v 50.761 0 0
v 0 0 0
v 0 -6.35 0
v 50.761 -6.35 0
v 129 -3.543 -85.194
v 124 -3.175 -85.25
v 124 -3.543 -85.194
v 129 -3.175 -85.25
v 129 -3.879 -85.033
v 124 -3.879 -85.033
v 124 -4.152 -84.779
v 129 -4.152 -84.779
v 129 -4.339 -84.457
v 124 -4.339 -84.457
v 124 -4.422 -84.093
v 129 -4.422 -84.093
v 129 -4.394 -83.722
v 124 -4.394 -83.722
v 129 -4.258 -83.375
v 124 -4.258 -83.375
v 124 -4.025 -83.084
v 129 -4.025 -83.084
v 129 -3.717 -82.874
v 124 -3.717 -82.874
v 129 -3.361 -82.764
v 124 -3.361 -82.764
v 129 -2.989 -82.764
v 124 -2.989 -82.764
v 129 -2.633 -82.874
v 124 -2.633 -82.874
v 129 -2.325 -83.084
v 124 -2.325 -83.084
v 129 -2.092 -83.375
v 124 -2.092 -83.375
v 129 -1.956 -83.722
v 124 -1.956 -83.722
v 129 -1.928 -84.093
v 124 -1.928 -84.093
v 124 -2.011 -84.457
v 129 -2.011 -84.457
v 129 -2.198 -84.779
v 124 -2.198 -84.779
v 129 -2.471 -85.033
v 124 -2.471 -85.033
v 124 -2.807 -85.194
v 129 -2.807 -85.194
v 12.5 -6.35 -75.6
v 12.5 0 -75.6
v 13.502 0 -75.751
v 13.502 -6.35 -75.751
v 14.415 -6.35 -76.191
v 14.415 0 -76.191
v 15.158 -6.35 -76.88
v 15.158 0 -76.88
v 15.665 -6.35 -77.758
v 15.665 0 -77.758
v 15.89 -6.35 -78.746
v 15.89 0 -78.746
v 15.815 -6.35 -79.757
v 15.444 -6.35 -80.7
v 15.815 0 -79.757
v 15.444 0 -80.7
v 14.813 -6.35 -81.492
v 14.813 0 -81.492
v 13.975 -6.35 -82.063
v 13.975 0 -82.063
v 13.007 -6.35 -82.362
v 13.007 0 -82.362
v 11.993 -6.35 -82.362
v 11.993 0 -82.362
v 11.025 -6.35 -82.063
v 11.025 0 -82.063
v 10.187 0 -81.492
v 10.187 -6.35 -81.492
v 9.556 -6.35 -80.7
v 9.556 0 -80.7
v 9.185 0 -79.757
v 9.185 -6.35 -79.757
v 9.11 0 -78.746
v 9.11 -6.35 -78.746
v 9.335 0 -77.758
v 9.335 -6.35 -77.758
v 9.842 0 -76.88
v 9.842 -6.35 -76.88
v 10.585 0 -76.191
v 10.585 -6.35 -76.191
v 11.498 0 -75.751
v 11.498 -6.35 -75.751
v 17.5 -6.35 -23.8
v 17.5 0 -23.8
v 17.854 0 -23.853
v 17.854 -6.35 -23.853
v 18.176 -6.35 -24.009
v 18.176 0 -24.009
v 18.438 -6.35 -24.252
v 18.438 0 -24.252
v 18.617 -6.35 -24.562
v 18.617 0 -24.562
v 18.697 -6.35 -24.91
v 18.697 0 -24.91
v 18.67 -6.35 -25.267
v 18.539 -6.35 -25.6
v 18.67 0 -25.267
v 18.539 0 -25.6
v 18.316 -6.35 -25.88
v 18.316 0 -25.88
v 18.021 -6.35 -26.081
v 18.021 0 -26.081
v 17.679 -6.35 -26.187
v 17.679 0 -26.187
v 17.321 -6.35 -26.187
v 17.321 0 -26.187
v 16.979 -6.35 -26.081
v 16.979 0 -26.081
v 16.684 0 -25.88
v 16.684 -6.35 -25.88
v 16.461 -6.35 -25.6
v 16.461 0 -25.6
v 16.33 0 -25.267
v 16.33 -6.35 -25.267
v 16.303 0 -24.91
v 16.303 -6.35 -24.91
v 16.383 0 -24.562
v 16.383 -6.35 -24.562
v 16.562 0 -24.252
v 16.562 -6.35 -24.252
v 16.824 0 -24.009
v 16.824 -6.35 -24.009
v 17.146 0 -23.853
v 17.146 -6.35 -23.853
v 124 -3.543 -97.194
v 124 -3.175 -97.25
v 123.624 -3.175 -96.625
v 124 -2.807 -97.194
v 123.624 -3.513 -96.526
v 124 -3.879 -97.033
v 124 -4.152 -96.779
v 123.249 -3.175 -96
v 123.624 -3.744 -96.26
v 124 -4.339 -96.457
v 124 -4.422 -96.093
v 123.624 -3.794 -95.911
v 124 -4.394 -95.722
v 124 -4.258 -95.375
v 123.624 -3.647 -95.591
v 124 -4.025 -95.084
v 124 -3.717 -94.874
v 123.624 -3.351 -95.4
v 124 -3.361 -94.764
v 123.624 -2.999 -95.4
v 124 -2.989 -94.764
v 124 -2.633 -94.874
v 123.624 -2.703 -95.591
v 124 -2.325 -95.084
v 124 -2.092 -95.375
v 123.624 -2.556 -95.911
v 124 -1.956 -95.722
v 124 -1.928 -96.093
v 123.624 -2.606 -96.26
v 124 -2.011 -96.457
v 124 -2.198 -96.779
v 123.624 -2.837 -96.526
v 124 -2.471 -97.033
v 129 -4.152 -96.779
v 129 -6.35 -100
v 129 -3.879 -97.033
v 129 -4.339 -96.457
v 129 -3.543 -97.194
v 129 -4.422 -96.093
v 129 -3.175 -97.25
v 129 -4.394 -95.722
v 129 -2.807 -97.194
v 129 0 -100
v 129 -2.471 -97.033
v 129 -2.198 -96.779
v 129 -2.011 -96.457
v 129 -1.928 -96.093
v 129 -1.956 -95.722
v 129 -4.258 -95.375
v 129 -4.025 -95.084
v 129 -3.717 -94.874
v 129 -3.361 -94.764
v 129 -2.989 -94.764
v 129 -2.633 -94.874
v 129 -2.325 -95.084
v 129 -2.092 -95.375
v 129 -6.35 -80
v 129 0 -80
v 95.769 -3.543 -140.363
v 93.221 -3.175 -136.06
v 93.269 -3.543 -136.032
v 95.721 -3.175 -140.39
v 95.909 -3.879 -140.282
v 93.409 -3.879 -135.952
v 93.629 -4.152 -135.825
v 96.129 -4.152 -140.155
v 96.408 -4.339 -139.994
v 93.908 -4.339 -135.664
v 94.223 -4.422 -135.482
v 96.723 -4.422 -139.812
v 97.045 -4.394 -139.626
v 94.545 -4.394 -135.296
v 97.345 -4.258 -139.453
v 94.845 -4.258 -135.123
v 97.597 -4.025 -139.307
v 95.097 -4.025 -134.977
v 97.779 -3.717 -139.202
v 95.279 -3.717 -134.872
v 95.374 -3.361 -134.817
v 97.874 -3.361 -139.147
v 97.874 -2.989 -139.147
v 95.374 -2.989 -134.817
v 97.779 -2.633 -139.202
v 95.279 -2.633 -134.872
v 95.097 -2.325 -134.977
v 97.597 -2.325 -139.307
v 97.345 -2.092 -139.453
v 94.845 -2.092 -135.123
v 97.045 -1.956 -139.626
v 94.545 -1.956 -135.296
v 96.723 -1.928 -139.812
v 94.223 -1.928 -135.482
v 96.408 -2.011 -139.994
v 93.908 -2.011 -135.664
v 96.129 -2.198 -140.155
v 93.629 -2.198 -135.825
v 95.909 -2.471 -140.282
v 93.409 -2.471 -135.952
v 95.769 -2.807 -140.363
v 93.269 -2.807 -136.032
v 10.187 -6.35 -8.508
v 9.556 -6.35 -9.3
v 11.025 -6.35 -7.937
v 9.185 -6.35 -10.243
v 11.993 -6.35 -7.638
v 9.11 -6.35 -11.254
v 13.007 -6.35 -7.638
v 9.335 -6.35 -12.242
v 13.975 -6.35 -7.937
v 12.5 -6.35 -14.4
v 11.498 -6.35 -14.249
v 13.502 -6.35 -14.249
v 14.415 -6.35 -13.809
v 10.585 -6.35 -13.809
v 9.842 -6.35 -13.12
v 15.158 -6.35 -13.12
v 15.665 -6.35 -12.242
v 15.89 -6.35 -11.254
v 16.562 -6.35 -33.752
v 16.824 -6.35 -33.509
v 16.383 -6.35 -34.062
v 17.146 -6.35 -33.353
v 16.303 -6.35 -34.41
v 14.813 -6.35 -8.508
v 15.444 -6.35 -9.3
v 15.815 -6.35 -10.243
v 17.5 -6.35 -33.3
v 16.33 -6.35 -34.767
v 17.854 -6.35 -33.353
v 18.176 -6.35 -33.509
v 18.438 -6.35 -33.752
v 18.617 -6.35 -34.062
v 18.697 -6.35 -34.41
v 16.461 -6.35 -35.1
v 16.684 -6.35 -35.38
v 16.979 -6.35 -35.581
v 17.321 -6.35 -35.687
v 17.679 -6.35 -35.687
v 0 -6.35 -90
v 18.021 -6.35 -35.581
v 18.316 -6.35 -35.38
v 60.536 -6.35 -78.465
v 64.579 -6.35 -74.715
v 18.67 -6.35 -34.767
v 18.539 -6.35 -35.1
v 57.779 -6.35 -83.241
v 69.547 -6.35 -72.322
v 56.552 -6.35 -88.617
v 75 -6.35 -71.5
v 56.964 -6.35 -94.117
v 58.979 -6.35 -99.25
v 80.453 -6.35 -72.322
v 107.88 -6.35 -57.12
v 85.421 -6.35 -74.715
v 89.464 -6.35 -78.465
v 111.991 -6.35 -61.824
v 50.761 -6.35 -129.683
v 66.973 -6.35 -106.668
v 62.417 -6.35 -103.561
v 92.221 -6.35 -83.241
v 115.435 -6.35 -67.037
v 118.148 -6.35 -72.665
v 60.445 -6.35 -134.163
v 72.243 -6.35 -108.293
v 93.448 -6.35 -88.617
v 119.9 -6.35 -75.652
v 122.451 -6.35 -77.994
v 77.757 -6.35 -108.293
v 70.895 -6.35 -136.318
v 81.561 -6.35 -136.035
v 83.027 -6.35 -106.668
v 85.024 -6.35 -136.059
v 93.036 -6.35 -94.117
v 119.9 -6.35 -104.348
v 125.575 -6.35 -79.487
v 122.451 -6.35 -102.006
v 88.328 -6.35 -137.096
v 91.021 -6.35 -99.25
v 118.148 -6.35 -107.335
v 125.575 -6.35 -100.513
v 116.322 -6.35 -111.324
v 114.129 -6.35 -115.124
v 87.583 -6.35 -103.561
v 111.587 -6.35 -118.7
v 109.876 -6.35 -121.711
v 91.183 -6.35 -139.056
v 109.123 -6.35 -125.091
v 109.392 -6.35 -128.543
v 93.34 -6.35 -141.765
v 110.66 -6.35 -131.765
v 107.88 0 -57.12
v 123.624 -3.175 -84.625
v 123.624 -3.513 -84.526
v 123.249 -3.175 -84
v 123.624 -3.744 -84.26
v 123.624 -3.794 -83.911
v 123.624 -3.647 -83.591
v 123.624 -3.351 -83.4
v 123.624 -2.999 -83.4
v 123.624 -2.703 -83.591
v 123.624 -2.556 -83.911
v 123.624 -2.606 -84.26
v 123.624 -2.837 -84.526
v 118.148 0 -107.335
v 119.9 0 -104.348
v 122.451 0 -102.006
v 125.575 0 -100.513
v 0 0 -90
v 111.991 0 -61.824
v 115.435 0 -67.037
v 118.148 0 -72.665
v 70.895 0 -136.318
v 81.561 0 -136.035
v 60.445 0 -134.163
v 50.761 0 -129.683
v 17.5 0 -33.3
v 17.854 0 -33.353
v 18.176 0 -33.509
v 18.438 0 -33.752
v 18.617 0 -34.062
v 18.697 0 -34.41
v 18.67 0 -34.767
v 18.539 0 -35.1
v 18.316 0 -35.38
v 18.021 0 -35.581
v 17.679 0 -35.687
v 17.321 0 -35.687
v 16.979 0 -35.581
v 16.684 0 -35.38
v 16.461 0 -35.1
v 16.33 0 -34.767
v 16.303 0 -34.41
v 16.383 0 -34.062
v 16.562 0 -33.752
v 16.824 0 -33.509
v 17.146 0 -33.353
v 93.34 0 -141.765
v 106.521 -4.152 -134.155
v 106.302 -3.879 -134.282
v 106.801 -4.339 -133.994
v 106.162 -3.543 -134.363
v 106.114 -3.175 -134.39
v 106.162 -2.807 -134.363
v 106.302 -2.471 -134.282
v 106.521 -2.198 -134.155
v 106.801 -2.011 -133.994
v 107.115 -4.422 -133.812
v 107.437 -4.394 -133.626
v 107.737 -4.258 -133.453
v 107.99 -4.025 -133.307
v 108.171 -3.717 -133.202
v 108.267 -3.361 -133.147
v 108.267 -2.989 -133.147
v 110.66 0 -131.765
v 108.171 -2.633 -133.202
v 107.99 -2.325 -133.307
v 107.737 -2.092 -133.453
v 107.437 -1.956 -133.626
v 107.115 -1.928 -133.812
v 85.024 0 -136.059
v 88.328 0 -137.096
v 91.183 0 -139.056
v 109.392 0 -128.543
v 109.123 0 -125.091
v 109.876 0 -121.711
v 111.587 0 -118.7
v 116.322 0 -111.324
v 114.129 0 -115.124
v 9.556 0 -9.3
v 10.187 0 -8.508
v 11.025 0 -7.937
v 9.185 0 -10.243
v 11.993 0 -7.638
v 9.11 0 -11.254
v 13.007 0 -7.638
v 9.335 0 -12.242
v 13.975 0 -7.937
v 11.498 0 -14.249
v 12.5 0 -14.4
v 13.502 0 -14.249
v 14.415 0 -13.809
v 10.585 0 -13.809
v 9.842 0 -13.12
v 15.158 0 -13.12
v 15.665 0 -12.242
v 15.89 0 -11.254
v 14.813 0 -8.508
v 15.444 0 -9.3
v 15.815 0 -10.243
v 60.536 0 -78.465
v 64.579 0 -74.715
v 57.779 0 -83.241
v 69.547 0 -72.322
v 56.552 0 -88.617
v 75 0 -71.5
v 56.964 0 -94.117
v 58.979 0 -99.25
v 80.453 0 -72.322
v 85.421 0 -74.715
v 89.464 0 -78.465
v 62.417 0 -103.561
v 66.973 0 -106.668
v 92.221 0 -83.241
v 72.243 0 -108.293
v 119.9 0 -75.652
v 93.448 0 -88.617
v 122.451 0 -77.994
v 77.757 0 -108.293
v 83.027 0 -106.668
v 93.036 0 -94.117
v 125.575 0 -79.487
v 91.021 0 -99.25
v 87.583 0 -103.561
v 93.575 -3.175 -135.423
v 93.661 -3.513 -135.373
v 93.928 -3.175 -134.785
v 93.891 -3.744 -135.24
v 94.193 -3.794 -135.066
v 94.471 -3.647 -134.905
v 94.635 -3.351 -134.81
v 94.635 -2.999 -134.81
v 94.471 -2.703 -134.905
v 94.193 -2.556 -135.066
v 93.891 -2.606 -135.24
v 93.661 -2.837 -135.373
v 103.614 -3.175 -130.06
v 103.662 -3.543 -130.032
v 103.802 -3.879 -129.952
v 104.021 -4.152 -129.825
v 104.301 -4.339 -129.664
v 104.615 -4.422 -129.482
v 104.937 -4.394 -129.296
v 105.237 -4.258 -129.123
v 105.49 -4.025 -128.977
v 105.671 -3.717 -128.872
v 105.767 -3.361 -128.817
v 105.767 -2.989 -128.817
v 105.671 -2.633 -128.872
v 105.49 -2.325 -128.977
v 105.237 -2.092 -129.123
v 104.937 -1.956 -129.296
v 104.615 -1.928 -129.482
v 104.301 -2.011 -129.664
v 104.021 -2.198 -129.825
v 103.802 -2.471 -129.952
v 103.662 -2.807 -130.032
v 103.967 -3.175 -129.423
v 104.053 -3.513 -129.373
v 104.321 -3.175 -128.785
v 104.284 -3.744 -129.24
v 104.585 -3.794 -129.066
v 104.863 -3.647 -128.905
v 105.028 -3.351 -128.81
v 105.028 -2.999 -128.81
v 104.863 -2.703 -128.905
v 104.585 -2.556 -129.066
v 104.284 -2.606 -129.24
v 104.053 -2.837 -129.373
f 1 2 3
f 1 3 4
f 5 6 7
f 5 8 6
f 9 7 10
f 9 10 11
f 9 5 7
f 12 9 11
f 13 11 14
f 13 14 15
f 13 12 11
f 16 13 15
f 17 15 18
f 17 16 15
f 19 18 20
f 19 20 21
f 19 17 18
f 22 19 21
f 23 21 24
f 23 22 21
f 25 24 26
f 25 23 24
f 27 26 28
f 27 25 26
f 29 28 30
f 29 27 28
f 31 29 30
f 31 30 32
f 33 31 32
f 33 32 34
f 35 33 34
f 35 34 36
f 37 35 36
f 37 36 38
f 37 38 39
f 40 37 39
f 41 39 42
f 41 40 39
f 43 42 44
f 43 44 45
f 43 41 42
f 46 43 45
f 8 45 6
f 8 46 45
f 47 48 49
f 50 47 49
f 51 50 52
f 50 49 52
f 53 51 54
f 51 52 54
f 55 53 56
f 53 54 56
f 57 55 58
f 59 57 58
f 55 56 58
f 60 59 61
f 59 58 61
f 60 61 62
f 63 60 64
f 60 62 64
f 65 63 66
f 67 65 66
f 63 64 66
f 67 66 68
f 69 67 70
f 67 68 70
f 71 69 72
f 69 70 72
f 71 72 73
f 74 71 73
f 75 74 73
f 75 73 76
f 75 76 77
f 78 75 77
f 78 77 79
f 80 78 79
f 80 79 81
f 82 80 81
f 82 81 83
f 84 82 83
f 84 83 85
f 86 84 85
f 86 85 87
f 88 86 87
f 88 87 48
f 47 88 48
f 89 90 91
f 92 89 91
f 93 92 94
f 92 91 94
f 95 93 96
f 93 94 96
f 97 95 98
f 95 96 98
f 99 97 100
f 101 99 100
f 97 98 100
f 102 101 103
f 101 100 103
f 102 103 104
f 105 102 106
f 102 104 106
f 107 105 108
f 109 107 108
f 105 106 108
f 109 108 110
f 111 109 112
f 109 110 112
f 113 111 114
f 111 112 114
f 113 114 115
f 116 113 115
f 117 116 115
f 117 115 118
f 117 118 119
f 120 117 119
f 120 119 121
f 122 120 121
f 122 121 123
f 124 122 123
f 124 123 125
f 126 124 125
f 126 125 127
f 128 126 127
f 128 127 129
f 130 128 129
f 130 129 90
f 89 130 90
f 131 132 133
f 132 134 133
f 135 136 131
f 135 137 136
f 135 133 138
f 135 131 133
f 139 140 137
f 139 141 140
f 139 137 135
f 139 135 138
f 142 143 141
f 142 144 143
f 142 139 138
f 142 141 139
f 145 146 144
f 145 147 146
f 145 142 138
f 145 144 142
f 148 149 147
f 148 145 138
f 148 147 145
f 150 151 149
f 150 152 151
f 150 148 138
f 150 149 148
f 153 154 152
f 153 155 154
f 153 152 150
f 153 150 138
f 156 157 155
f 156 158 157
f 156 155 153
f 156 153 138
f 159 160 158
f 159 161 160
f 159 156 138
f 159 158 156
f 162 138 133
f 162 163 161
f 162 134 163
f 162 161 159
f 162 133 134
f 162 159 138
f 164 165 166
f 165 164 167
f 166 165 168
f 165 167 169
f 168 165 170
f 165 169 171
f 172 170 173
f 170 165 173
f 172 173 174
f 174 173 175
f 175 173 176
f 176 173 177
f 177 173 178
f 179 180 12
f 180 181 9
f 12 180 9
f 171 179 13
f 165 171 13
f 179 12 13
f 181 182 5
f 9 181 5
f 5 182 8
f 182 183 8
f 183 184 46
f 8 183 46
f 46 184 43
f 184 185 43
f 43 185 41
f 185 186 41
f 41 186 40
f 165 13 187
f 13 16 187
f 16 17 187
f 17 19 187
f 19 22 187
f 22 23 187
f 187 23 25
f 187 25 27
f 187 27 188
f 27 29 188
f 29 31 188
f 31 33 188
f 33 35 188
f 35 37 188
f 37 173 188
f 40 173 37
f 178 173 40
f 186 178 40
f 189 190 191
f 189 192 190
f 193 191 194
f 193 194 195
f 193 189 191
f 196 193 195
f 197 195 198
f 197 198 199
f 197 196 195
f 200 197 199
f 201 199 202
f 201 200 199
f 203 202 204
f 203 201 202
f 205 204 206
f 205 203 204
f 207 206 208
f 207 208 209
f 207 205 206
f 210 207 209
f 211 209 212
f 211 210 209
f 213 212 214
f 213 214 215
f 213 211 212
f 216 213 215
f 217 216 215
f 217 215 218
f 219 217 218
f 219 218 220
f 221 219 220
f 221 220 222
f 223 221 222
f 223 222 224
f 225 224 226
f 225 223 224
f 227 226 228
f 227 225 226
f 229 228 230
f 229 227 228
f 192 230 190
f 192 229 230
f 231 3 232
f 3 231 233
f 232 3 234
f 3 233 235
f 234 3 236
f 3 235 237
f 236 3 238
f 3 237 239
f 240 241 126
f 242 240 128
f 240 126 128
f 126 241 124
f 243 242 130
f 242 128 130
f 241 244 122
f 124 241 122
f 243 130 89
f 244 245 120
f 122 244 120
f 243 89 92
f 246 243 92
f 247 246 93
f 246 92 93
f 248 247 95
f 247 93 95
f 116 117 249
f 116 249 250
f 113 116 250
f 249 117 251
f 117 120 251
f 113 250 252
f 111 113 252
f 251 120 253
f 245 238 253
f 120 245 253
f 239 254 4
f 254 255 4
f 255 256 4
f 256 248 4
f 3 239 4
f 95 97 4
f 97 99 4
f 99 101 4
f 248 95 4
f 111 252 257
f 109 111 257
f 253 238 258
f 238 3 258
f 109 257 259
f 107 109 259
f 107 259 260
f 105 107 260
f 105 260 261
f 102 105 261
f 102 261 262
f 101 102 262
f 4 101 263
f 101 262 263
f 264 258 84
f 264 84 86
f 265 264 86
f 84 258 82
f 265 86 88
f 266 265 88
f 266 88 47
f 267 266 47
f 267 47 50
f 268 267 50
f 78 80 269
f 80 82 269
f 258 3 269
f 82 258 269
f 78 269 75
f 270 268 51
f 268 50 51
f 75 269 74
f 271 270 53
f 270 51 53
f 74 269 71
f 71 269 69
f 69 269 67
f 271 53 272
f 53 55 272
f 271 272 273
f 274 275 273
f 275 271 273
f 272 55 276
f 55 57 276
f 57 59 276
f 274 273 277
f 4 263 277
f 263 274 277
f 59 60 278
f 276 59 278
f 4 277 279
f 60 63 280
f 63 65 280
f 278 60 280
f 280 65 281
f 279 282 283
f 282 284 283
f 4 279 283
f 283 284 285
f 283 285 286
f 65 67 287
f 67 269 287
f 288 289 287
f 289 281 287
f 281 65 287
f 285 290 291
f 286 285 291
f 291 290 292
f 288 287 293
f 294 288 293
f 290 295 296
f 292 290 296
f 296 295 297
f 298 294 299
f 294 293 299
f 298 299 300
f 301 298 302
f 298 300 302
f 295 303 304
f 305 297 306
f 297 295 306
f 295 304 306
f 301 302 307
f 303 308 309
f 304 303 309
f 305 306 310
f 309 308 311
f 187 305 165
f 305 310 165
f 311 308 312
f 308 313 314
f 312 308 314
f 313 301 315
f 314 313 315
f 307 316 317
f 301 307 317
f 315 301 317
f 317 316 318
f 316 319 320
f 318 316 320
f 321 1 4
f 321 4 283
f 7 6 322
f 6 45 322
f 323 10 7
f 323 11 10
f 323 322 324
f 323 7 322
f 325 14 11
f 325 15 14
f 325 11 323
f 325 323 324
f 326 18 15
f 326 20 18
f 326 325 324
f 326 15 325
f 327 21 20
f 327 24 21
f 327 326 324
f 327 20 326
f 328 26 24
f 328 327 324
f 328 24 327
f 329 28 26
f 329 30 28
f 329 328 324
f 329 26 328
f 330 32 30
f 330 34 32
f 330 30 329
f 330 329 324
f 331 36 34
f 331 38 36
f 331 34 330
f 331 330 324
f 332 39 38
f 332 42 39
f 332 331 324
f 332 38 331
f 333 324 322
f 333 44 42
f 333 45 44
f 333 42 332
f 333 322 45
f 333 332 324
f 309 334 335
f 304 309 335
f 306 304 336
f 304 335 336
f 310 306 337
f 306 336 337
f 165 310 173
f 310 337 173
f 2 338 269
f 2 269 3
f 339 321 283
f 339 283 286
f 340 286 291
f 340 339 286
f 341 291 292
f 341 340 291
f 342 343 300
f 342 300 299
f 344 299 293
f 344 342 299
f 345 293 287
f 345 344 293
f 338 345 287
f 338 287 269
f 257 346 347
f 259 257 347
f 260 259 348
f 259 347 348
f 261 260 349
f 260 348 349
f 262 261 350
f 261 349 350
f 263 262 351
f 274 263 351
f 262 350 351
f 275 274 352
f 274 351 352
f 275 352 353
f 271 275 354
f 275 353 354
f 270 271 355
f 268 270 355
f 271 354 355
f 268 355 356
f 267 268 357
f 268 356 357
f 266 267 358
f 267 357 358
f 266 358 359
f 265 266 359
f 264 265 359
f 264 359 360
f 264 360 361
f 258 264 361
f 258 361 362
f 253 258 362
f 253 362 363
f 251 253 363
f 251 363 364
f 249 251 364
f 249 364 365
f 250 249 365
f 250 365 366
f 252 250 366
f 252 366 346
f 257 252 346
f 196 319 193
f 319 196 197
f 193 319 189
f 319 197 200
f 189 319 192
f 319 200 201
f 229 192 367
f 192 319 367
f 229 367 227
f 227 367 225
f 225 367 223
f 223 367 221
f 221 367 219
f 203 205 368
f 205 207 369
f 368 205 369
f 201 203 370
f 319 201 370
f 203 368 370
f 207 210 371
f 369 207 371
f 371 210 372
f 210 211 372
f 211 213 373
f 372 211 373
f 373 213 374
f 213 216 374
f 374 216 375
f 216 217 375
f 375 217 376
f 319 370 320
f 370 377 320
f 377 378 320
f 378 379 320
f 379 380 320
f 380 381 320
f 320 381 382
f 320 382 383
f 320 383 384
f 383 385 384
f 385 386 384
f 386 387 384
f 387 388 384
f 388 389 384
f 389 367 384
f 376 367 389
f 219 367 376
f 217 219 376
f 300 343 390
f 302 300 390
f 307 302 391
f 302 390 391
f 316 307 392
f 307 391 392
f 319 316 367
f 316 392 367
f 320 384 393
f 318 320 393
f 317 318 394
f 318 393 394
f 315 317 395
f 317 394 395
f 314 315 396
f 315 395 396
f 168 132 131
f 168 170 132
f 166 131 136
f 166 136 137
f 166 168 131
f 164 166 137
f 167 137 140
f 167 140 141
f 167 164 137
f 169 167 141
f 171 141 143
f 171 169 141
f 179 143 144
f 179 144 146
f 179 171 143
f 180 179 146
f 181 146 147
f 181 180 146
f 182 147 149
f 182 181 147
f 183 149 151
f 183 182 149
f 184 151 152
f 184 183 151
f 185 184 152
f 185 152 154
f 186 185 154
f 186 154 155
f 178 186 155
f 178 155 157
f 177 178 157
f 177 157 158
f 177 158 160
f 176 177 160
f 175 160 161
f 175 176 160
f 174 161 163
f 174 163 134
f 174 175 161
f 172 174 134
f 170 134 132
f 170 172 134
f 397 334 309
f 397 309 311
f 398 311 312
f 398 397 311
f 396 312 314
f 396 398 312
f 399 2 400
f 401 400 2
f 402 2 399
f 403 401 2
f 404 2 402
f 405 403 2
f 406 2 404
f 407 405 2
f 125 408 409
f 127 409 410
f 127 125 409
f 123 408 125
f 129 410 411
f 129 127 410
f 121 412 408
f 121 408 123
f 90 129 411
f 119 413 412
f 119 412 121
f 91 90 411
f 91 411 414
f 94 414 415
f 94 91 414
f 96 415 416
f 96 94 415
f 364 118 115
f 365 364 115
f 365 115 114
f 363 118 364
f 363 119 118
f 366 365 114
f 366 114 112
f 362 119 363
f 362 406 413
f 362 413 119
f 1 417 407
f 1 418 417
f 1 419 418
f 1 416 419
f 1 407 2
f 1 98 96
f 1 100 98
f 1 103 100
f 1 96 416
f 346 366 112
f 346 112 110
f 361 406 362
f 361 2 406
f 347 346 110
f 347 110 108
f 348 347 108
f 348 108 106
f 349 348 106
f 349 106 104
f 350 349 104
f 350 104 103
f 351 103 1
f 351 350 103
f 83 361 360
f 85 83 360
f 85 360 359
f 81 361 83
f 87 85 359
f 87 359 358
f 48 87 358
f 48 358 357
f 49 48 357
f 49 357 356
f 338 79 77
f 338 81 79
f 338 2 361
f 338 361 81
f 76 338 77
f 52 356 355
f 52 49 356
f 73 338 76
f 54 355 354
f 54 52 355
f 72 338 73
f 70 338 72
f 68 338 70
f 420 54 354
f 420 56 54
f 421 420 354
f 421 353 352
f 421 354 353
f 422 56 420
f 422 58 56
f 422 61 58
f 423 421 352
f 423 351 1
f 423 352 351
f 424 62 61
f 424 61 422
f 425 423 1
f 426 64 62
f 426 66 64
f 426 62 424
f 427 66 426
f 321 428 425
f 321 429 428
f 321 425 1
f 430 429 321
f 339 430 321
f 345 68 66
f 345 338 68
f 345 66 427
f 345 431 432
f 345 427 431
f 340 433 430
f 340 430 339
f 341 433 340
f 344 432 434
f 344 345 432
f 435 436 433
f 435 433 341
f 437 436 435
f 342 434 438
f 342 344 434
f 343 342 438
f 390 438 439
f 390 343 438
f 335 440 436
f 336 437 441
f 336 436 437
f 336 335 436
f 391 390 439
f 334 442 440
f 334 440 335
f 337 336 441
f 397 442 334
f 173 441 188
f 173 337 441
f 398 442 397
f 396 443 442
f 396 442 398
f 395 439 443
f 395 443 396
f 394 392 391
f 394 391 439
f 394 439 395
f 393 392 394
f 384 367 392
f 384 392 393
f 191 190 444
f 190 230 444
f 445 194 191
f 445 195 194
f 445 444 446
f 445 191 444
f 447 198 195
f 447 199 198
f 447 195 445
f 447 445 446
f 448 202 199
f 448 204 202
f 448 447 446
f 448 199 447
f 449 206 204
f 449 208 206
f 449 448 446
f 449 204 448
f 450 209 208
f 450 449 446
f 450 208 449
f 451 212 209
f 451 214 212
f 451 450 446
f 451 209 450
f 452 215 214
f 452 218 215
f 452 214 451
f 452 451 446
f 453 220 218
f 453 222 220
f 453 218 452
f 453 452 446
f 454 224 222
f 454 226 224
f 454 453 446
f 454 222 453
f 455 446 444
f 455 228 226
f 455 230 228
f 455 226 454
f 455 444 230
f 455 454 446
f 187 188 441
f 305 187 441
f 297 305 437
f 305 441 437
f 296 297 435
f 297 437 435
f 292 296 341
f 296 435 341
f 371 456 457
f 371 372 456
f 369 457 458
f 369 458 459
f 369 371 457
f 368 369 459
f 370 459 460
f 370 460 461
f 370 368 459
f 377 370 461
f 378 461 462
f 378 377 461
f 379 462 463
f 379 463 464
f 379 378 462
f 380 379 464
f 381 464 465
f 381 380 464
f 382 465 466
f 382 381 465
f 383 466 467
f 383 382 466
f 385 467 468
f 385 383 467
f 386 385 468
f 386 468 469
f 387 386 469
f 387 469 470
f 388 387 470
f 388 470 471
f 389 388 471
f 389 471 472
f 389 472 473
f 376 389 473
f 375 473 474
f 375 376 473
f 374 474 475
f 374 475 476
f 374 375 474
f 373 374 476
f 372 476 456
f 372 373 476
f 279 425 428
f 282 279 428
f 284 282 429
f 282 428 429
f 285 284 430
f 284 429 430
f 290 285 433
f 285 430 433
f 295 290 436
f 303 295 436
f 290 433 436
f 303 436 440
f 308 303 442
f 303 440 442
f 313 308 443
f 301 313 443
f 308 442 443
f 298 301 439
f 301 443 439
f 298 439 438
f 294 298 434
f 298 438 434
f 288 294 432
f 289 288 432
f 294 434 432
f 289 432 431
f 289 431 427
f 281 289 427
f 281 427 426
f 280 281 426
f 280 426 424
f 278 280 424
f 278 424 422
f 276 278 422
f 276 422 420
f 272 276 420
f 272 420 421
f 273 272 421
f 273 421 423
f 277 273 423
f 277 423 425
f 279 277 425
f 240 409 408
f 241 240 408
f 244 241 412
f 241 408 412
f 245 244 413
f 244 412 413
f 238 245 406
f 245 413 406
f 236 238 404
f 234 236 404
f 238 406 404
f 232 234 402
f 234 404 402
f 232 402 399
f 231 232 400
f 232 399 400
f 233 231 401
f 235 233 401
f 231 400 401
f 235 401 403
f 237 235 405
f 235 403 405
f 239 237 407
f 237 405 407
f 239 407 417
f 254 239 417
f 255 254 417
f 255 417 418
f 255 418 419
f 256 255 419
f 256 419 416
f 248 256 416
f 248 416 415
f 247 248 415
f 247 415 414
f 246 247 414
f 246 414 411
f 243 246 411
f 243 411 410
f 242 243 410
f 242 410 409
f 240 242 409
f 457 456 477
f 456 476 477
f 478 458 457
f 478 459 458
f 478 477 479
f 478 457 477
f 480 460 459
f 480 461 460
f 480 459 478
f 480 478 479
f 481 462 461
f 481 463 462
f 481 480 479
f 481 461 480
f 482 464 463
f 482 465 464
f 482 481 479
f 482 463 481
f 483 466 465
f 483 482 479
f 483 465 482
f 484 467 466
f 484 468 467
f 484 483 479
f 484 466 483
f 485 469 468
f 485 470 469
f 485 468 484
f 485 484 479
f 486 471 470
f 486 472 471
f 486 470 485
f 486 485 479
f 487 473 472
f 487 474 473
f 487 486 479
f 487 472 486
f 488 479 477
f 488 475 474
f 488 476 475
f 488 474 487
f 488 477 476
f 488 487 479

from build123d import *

# Parameters (mm, degrees)
BASE_FLANGE1_DEPTH                   = 6.35
SKETCH8_R                            = 3.4
CUT_EXTRUDE1_DEPTH                   = 183.851914127
SKETCH9_R                            = 18.5
CUT_EXTRUDE2_DEPTH                   = 183.851914127
SKETCH11_R                           = 1.2
CUT_EXTRUDE4_DEPTH                   = 183.851914127
BOSS_EXTRUDE2_START                  = -6.35
BOSS_EXTRUDE2_DEPTH                  = 6.35
TAP_DRILL_FOR_M3X0_5_TAP2_AT_2_COUNT = 2
TAP_DRILL_FOR_M3X0_5_TAP2_AT_2_PITCH = 12
CIRPATTERN3_COUNT                    = 2
CIRPATTERN3_ANGLE                    = 60


# Sheet-metal steps are written as plain solids
with BuildPart() as part:
    # Sketch2 → Base-Flange1 (new body)
    with BuildSketch(Plane(origin=(0, 0, 0), x_dir=(1, 0, 0), z_dir=(0, 1, 0))):
        with BuildLine():
            Line((0, 0), (50.76093065, 0))
            Line((50.76093065, 0), (107.880465325, 57.119534675))
            ThreePointArc((107.880465325, 57.119534675), (111.537953618, 118.761570635), (50.76093065, 129.682710556))
            Line((50.76093065, 129.682710556), (0, 90))
            Line((0, 90), (0, 0))
        make_face()
    extrude(amount=-BASE_FLANGE1_DEPTH)

    # Sketch8 → Cut-Extrude1 (cut, through all)
    with BuildSketch(Plane(origin=(0, 0, 0), x_dir=(1, 0, 0), z_dir=(0, 1, 0))):
        with Locations(Location((12.5, 79, 0), (0, 0, 270))):
            Circle(SKETCH8_R)
        with Locations(Location((12.5, 11, 0), (0, 0, 90))):
            Circle(SKETCH8_R)
    extrude(amount=-CUT_EXTRUDE1_DEPTH, mode=Mode.SUBTRACT)

    # Sketch9 → Cut-Extrude2 (cut, through all)
    with BuildSketch(Plane(origin=(0, 0, 0), x_dir=(1, 0, 0), z_dir=(0, 1, 0))):
        with Locations(Location((75, 90, 0), (0, 0, 270))):
            Circle(SKETCH9_R)
    extrude(amount=-CUT_EXTRUDE2_DEPTH, mode=Mode.SUBTRACT)

    # Sketch11 → Cut-Extrude4 (cut, through all)
    with BuildSketch(Plane(origin=(0, 0, 0), x_dir=(1, 0, 0), z_dir=(0, 1, 0))):
        with Locations(Location((17.5, 25, 0), (0, 0, 270))):
            Circle(SKETCH11_R)
        with Locations(Location((17.5, 34.5, 0), (0, 0, 270))):
            Circle(SKETCH11_R)
    extrude(amount=-CUT_EXTRUDE4_DEPTH, mode=Mode.SUBTRACT)

    # Sketch15 → Boss-Extrude2 (add)
    with BuildSketch(Plane.XZ.offset(6.35).offset(BOSS_EXTRUDE2_START)):
        with BuildLine():
            Line((129, -100), (129, -80))
            ThreePointArc((129, -80), (122.450687881, -77.994187792), (118.147884423, -72.66477373))
            ThreePointArc((118.147884423, -72.66477373), (121.5, -90), (118.147884423, -107.33522627))
            ThreePointArc((118.147884423, -107.33522627), (122.450687881, -102.005812208), (129, -100))
        make_face()
    boss_extrude2 = extrude(amount=BOSS_EXTRUDE2_DEPTH)

    # Sketch17 → Tap Drill for M3x0.5 Tap2 (revolve, cut)
    with BuildSketch(Plane(origin=(129, -3.175, -84), x_dir=(0, 0, -1), z_dir=(0, 1, 0))):
        Polygon((0, 0), (0, 5.751075774), (1.25, 5), (1.25, 0), align=None)
    tap_drill_for_m3x0_5_tap2 = revolve(axis=Axis((135.35, -3.175, -84), (-1, 0, 0)), mode=Mode.SUBTRACT)

    # Tap Drill for M3x0.5 Tap2 at 2: Tap Drill for M3x0.5 Tap2 ×2
    with Locations(*[(0, 0, -i * TAP_DRILL_FOR_M3X0_5_TAP2_AT_2_PITCH) for i in range(1, TAP_DRILL_FOR_M3X0_5_TAP2_AT_2_COUNT)]):
        add(tap_drill_for_m3x0_5_tap2, mode=Mode.SUBTRACT)

    # CirPattern3: Boss-Extrude2, Tap Drill for M3x0.5 Tap2 ×2 about axis
    cirpattern3_axis = Axis((75, 0, -90), (0, 1, 0))
    add([boss_extrude2.rotate(cirpattern3_axis, i * CIRPATTERN3_ANGLE / (CIRPATTERN3_COUNT - 1)) for i in range(1, CIRPATTERN3_COUNT)])
    add([tap_drill_for_m3x0_5_tap2.rotate(cirpattern3_axis, i * CIRPATTERN3_ANGLE / (CIRPATTERN3_COUNT - 1)) for i in range(1, CIRPATTERN3_COUNT)], mode=Mode.SUBTRACT)

    # CirPattern3 copy 1 sketch → CirPattern3 copy 1 (revolve, cut)
    with BuildSketch(Plane(origin=(96.803847577, -3.175, -139.765371804), x_dir=(-0.8660254037844399, 0, -0.4999999999999978), z_dir=(0, 1, 0))):
        Polygon((0, 0), (0, 5.751075774), (1.25, 5), (1.25, 0), align=None)
    revolve(axis=Axis((99.978847577, -3.175, -145.264633118), (-0.4999999999999978, 0, 0.8660254037844399)), mode=Mode.SUBTRACT)


solid = part.part
